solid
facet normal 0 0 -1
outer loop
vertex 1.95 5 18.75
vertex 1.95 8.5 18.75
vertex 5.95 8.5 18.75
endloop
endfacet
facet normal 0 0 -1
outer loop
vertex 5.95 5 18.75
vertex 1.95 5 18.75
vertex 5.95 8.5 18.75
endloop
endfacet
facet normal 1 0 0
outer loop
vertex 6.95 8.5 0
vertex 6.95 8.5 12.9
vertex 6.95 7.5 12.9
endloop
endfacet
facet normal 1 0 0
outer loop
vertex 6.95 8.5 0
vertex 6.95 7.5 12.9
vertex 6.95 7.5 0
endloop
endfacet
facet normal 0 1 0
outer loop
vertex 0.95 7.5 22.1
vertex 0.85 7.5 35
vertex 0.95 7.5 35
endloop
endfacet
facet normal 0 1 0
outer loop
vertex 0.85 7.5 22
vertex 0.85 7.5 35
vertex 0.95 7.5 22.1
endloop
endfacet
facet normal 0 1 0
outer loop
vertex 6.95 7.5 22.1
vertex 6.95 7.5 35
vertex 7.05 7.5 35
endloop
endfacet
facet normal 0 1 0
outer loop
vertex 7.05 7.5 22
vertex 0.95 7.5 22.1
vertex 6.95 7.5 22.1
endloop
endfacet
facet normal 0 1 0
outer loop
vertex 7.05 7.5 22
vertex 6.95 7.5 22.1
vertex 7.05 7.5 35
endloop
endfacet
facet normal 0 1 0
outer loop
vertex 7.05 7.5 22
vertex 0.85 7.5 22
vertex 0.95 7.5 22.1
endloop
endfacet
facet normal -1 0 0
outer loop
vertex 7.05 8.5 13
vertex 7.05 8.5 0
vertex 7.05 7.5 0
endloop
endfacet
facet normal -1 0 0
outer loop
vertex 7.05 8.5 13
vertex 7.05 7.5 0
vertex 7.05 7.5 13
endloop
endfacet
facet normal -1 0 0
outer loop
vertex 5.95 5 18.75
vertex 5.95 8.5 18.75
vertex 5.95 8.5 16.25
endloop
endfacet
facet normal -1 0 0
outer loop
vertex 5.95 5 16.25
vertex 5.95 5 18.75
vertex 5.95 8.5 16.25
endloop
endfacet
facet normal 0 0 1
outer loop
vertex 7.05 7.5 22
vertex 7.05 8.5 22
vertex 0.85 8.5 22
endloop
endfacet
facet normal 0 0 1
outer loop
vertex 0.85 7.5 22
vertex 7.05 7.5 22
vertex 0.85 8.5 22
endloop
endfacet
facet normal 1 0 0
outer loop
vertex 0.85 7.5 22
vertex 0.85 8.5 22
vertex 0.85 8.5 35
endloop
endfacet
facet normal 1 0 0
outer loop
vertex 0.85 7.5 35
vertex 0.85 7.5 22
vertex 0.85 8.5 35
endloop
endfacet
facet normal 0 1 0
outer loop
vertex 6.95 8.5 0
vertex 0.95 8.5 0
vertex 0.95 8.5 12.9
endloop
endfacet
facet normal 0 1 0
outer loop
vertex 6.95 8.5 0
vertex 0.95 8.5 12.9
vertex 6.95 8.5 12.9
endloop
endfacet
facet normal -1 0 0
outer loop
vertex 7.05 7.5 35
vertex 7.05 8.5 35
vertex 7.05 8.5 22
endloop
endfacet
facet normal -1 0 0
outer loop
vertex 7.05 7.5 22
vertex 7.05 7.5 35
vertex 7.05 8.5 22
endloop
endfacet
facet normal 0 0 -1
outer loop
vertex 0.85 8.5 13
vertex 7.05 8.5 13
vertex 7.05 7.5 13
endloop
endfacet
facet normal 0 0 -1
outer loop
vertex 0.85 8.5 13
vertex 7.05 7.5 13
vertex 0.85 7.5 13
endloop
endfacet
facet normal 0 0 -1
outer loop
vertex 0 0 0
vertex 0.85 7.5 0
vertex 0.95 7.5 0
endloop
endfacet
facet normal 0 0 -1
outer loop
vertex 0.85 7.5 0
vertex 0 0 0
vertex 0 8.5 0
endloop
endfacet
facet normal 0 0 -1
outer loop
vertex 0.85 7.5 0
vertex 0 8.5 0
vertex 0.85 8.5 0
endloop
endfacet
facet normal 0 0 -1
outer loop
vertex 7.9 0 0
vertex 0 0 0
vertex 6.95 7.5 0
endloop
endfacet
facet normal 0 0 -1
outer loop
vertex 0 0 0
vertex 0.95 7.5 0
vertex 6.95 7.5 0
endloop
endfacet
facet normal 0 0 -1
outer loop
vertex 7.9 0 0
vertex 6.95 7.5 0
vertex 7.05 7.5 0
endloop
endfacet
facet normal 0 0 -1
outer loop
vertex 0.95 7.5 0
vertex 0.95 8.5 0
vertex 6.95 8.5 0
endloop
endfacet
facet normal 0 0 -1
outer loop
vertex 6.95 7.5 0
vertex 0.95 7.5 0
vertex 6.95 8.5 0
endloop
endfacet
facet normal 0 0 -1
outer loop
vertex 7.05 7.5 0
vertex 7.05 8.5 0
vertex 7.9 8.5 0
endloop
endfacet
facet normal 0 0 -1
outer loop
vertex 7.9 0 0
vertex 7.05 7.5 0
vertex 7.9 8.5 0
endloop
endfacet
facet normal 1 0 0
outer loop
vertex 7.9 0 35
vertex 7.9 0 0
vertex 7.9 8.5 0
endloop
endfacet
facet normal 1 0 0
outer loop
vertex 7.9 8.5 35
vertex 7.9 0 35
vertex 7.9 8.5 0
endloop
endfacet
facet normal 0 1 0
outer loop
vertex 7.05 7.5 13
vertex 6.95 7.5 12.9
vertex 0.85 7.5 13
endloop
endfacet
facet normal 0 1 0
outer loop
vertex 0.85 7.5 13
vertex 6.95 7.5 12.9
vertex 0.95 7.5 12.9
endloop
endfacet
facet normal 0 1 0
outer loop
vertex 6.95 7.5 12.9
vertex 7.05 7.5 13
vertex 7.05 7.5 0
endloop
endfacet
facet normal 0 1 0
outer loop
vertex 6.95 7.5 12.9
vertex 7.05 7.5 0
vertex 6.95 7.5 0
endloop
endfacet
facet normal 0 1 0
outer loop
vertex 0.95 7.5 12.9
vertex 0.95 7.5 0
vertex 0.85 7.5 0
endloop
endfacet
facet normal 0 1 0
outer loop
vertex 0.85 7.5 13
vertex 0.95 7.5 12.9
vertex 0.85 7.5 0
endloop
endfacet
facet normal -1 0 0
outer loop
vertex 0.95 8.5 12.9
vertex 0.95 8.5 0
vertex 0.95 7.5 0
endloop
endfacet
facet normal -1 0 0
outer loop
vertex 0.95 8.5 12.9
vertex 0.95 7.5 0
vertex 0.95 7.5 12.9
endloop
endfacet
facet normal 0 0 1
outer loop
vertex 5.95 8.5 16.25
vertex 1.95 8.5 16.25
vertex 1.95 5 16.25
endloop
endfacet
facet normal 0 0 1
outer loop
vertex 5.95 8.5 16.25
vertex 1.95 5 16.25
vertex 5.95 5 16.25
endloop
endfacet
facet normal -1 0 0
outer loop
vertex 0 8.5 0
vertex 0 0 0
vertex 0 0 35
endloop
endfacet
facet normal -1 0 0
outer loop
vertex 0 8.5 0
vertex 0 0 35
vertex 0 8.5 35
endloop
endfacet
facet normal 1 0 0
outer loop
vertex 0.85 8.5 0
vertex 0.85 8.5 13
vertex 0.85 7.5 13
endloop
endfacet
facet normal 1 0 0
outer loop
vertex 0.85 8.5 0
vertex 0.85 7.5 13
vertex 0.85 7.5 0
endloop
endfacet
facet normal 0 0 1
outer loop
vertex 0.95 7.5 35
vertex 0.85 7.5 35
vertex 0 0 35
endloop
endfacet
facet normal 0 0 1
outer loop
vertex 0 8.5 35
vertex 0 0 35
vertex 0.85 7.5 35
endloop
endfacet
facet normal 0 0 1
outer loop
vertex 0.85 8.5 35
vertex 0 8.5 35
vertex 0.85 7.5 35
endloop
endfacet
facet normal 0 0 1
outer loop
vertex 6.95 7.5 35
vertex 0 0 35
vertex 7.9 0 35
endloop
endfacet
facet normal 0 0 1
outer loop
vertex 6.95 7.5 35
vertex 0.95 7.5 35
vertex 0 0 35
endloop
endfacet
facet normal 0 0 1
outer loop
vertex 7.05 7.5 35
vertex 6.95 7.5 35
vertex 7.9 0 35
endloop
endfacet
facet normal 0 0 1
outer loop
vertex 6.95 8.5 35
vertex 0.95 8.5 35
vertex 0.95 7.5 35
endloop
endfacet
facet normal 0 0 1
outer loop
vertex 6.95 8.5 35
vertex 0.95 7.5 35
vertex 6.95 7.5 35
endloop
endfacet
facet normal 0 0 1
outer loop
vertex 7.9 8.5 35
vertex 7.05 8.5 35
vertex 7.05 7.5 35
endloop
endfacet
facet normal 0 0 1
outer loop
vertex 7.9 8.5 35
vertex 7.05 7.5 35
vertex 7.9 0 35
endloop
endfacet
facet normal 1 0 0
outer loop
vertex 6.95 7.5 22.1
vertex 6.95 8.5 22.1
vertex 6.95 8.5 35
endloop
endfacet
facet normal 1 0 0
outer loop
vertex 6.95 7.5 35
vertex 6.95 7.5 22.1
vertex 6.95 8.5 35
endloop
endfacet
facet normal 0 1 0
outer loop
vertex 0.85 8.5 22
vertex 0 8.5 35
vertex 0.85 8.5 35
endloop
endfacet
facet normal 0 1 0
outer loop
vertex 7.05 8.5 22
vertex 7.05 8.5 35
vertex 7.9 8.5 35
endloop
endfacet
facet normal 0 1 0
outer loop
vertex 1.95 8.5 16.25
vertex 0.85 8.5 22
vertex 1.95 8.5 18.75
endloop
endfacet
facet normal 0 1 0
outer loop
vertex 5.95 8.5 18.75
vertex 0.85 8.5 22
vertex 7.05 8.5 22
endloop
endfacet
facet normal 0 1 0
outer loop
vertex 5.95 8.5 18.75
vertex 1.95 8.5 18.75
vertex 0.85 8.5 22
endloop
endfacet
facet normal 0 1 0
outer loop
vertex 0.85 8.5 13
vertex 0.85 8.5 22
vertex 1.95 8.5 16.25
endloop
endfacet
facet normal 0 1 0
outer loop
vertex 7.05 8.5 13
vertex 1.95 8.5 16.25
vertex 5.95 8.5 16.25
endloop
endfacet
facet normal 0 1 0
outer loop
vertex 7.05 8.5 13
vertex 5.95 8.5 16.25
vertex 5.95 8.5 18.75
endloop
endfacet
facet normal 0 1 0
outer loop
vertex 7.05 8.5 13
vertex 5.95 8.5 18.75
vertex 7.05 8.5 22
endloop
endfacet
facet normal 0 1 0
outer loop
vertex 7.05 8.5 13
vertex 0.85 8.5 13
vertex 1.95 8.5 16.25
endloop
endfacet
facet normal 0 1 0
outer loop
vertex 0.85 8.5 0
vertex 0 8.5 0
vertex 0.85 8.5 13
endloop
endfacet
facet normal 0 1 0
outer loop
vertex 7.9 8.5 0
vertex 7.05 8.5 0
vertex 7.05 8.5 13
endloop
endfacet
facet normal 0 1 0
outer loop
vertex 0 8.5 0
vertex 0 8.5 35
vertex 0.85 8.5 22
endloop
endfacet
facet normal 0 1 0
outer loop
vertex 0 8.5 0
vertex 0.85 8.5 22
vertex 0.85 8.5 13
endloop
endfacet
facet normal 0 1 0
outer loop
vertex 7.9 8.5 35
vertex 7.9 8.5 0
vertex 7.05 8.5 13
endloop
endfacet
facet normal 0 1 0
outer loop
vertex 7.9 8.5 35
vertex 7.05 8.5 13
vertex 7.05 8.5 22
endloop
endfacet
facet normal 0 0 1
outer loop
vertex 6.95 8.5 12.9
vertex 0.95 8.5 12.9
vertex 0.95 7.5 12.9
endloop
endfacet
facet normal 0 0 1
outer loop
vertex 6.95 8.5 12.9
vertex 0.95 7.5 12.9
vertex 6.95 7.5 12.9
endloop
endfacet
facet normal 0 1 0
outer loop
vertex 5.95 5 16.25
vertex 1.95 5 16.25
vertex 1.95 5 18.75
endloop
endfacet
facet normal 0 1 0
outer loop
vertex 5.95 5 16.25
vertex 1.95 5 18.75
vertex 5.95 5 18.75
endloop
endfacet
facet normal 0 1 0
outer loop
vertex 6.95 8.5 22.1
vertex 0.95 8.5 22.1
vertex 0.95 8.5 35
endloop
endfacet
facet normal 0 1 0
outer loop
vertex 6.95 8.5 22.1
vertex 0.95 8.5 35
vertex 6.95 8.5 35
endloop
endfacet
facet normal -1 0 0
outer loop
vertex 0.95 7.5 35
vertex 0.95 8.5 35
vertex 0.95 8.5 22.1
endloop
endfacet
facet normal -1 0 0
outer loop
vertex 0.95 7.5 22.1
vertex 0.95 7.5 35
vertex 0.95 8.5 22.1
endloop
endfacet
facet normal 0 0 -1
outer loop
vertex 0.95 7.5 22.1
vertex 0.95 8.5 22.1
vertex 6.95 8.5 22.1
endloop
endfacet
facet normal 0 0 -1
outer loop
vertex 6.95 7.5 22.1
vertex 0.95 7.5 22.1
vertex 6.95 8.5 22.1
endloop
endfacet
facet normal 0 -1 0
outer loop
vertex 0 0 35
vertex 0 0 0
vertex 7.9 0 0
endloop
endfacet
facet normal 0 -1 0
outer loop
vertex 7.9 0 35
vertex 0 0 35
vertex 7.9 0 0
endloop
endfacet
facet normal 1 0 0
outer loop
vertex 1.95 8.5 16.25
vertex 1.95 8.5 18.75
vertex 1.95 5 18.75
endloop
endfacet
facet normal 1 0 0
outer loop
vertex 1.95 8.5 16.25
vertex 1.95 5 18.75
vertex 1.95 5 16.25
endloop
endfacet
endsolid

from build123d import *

# Parameters (mm, degrees)
SKETCH1_W           = 7.9
SKETCH1_H           = 8.5
BOSS_EXTRUDE1_DEPTH = 35
CUT_EXTRUDE1_DEPTH  = 1
SKETCH3_W           = 4
SKETCH3_H           = 2.5
CUT_EXTRUDE2_DEPTH  = 3.5


with BuildPart() as part:
    # Sketch1 → Boss-Extrude1 (new body)
    with BuildSketch(Plane.XY):
        with Locations((3.95, 4.25)):
            Rectangle(SKETCH1_W, SKETCH1_H)
    extrude(amount=BOSS_EXTRUDE1_DEPTH)

    # Sketch2 → Cut-Extrude1 (cut)
    with BuildSketch(Plane(origin=(0, 8.5, 0), x_dir=(1, 0, 0), z_dir=(0, 1, 0))):
        Polygon((0.85, -35), (0.95, -35), (0.95, -22.1), (6.95, -22.1), (6.95, -35), (7.05, -35), (7.05, -22), (0.85, -22), align=None)
        Polygon((6.95, 0), (7.05, 0), (7.05, -13), (0.85, -13), (0.85, 0), (0.95, 0), (0.95, -12.9), (6.95, -12.9), align=None)
    extrude(amount=-CUT_EXTRUDE1_DEPTH, mode=Mode.SUBTRACT)

    # Sketch3 → Cut-Extrude2 (cut)
    with BuildSketch(Plane(origin=(0, 8.5, 0), x_dir=(1, 0, 0), z_dir=(0, 1, 0))):
        with Locations((3.95, -17.5)):
            Rectangle(SKETCH3_W, SKETCH3_H)
    extrude(amount=-CUT_EXTRUDE2_DEPTH, mode=Mode.SUBTRACT)


solid = part.part
